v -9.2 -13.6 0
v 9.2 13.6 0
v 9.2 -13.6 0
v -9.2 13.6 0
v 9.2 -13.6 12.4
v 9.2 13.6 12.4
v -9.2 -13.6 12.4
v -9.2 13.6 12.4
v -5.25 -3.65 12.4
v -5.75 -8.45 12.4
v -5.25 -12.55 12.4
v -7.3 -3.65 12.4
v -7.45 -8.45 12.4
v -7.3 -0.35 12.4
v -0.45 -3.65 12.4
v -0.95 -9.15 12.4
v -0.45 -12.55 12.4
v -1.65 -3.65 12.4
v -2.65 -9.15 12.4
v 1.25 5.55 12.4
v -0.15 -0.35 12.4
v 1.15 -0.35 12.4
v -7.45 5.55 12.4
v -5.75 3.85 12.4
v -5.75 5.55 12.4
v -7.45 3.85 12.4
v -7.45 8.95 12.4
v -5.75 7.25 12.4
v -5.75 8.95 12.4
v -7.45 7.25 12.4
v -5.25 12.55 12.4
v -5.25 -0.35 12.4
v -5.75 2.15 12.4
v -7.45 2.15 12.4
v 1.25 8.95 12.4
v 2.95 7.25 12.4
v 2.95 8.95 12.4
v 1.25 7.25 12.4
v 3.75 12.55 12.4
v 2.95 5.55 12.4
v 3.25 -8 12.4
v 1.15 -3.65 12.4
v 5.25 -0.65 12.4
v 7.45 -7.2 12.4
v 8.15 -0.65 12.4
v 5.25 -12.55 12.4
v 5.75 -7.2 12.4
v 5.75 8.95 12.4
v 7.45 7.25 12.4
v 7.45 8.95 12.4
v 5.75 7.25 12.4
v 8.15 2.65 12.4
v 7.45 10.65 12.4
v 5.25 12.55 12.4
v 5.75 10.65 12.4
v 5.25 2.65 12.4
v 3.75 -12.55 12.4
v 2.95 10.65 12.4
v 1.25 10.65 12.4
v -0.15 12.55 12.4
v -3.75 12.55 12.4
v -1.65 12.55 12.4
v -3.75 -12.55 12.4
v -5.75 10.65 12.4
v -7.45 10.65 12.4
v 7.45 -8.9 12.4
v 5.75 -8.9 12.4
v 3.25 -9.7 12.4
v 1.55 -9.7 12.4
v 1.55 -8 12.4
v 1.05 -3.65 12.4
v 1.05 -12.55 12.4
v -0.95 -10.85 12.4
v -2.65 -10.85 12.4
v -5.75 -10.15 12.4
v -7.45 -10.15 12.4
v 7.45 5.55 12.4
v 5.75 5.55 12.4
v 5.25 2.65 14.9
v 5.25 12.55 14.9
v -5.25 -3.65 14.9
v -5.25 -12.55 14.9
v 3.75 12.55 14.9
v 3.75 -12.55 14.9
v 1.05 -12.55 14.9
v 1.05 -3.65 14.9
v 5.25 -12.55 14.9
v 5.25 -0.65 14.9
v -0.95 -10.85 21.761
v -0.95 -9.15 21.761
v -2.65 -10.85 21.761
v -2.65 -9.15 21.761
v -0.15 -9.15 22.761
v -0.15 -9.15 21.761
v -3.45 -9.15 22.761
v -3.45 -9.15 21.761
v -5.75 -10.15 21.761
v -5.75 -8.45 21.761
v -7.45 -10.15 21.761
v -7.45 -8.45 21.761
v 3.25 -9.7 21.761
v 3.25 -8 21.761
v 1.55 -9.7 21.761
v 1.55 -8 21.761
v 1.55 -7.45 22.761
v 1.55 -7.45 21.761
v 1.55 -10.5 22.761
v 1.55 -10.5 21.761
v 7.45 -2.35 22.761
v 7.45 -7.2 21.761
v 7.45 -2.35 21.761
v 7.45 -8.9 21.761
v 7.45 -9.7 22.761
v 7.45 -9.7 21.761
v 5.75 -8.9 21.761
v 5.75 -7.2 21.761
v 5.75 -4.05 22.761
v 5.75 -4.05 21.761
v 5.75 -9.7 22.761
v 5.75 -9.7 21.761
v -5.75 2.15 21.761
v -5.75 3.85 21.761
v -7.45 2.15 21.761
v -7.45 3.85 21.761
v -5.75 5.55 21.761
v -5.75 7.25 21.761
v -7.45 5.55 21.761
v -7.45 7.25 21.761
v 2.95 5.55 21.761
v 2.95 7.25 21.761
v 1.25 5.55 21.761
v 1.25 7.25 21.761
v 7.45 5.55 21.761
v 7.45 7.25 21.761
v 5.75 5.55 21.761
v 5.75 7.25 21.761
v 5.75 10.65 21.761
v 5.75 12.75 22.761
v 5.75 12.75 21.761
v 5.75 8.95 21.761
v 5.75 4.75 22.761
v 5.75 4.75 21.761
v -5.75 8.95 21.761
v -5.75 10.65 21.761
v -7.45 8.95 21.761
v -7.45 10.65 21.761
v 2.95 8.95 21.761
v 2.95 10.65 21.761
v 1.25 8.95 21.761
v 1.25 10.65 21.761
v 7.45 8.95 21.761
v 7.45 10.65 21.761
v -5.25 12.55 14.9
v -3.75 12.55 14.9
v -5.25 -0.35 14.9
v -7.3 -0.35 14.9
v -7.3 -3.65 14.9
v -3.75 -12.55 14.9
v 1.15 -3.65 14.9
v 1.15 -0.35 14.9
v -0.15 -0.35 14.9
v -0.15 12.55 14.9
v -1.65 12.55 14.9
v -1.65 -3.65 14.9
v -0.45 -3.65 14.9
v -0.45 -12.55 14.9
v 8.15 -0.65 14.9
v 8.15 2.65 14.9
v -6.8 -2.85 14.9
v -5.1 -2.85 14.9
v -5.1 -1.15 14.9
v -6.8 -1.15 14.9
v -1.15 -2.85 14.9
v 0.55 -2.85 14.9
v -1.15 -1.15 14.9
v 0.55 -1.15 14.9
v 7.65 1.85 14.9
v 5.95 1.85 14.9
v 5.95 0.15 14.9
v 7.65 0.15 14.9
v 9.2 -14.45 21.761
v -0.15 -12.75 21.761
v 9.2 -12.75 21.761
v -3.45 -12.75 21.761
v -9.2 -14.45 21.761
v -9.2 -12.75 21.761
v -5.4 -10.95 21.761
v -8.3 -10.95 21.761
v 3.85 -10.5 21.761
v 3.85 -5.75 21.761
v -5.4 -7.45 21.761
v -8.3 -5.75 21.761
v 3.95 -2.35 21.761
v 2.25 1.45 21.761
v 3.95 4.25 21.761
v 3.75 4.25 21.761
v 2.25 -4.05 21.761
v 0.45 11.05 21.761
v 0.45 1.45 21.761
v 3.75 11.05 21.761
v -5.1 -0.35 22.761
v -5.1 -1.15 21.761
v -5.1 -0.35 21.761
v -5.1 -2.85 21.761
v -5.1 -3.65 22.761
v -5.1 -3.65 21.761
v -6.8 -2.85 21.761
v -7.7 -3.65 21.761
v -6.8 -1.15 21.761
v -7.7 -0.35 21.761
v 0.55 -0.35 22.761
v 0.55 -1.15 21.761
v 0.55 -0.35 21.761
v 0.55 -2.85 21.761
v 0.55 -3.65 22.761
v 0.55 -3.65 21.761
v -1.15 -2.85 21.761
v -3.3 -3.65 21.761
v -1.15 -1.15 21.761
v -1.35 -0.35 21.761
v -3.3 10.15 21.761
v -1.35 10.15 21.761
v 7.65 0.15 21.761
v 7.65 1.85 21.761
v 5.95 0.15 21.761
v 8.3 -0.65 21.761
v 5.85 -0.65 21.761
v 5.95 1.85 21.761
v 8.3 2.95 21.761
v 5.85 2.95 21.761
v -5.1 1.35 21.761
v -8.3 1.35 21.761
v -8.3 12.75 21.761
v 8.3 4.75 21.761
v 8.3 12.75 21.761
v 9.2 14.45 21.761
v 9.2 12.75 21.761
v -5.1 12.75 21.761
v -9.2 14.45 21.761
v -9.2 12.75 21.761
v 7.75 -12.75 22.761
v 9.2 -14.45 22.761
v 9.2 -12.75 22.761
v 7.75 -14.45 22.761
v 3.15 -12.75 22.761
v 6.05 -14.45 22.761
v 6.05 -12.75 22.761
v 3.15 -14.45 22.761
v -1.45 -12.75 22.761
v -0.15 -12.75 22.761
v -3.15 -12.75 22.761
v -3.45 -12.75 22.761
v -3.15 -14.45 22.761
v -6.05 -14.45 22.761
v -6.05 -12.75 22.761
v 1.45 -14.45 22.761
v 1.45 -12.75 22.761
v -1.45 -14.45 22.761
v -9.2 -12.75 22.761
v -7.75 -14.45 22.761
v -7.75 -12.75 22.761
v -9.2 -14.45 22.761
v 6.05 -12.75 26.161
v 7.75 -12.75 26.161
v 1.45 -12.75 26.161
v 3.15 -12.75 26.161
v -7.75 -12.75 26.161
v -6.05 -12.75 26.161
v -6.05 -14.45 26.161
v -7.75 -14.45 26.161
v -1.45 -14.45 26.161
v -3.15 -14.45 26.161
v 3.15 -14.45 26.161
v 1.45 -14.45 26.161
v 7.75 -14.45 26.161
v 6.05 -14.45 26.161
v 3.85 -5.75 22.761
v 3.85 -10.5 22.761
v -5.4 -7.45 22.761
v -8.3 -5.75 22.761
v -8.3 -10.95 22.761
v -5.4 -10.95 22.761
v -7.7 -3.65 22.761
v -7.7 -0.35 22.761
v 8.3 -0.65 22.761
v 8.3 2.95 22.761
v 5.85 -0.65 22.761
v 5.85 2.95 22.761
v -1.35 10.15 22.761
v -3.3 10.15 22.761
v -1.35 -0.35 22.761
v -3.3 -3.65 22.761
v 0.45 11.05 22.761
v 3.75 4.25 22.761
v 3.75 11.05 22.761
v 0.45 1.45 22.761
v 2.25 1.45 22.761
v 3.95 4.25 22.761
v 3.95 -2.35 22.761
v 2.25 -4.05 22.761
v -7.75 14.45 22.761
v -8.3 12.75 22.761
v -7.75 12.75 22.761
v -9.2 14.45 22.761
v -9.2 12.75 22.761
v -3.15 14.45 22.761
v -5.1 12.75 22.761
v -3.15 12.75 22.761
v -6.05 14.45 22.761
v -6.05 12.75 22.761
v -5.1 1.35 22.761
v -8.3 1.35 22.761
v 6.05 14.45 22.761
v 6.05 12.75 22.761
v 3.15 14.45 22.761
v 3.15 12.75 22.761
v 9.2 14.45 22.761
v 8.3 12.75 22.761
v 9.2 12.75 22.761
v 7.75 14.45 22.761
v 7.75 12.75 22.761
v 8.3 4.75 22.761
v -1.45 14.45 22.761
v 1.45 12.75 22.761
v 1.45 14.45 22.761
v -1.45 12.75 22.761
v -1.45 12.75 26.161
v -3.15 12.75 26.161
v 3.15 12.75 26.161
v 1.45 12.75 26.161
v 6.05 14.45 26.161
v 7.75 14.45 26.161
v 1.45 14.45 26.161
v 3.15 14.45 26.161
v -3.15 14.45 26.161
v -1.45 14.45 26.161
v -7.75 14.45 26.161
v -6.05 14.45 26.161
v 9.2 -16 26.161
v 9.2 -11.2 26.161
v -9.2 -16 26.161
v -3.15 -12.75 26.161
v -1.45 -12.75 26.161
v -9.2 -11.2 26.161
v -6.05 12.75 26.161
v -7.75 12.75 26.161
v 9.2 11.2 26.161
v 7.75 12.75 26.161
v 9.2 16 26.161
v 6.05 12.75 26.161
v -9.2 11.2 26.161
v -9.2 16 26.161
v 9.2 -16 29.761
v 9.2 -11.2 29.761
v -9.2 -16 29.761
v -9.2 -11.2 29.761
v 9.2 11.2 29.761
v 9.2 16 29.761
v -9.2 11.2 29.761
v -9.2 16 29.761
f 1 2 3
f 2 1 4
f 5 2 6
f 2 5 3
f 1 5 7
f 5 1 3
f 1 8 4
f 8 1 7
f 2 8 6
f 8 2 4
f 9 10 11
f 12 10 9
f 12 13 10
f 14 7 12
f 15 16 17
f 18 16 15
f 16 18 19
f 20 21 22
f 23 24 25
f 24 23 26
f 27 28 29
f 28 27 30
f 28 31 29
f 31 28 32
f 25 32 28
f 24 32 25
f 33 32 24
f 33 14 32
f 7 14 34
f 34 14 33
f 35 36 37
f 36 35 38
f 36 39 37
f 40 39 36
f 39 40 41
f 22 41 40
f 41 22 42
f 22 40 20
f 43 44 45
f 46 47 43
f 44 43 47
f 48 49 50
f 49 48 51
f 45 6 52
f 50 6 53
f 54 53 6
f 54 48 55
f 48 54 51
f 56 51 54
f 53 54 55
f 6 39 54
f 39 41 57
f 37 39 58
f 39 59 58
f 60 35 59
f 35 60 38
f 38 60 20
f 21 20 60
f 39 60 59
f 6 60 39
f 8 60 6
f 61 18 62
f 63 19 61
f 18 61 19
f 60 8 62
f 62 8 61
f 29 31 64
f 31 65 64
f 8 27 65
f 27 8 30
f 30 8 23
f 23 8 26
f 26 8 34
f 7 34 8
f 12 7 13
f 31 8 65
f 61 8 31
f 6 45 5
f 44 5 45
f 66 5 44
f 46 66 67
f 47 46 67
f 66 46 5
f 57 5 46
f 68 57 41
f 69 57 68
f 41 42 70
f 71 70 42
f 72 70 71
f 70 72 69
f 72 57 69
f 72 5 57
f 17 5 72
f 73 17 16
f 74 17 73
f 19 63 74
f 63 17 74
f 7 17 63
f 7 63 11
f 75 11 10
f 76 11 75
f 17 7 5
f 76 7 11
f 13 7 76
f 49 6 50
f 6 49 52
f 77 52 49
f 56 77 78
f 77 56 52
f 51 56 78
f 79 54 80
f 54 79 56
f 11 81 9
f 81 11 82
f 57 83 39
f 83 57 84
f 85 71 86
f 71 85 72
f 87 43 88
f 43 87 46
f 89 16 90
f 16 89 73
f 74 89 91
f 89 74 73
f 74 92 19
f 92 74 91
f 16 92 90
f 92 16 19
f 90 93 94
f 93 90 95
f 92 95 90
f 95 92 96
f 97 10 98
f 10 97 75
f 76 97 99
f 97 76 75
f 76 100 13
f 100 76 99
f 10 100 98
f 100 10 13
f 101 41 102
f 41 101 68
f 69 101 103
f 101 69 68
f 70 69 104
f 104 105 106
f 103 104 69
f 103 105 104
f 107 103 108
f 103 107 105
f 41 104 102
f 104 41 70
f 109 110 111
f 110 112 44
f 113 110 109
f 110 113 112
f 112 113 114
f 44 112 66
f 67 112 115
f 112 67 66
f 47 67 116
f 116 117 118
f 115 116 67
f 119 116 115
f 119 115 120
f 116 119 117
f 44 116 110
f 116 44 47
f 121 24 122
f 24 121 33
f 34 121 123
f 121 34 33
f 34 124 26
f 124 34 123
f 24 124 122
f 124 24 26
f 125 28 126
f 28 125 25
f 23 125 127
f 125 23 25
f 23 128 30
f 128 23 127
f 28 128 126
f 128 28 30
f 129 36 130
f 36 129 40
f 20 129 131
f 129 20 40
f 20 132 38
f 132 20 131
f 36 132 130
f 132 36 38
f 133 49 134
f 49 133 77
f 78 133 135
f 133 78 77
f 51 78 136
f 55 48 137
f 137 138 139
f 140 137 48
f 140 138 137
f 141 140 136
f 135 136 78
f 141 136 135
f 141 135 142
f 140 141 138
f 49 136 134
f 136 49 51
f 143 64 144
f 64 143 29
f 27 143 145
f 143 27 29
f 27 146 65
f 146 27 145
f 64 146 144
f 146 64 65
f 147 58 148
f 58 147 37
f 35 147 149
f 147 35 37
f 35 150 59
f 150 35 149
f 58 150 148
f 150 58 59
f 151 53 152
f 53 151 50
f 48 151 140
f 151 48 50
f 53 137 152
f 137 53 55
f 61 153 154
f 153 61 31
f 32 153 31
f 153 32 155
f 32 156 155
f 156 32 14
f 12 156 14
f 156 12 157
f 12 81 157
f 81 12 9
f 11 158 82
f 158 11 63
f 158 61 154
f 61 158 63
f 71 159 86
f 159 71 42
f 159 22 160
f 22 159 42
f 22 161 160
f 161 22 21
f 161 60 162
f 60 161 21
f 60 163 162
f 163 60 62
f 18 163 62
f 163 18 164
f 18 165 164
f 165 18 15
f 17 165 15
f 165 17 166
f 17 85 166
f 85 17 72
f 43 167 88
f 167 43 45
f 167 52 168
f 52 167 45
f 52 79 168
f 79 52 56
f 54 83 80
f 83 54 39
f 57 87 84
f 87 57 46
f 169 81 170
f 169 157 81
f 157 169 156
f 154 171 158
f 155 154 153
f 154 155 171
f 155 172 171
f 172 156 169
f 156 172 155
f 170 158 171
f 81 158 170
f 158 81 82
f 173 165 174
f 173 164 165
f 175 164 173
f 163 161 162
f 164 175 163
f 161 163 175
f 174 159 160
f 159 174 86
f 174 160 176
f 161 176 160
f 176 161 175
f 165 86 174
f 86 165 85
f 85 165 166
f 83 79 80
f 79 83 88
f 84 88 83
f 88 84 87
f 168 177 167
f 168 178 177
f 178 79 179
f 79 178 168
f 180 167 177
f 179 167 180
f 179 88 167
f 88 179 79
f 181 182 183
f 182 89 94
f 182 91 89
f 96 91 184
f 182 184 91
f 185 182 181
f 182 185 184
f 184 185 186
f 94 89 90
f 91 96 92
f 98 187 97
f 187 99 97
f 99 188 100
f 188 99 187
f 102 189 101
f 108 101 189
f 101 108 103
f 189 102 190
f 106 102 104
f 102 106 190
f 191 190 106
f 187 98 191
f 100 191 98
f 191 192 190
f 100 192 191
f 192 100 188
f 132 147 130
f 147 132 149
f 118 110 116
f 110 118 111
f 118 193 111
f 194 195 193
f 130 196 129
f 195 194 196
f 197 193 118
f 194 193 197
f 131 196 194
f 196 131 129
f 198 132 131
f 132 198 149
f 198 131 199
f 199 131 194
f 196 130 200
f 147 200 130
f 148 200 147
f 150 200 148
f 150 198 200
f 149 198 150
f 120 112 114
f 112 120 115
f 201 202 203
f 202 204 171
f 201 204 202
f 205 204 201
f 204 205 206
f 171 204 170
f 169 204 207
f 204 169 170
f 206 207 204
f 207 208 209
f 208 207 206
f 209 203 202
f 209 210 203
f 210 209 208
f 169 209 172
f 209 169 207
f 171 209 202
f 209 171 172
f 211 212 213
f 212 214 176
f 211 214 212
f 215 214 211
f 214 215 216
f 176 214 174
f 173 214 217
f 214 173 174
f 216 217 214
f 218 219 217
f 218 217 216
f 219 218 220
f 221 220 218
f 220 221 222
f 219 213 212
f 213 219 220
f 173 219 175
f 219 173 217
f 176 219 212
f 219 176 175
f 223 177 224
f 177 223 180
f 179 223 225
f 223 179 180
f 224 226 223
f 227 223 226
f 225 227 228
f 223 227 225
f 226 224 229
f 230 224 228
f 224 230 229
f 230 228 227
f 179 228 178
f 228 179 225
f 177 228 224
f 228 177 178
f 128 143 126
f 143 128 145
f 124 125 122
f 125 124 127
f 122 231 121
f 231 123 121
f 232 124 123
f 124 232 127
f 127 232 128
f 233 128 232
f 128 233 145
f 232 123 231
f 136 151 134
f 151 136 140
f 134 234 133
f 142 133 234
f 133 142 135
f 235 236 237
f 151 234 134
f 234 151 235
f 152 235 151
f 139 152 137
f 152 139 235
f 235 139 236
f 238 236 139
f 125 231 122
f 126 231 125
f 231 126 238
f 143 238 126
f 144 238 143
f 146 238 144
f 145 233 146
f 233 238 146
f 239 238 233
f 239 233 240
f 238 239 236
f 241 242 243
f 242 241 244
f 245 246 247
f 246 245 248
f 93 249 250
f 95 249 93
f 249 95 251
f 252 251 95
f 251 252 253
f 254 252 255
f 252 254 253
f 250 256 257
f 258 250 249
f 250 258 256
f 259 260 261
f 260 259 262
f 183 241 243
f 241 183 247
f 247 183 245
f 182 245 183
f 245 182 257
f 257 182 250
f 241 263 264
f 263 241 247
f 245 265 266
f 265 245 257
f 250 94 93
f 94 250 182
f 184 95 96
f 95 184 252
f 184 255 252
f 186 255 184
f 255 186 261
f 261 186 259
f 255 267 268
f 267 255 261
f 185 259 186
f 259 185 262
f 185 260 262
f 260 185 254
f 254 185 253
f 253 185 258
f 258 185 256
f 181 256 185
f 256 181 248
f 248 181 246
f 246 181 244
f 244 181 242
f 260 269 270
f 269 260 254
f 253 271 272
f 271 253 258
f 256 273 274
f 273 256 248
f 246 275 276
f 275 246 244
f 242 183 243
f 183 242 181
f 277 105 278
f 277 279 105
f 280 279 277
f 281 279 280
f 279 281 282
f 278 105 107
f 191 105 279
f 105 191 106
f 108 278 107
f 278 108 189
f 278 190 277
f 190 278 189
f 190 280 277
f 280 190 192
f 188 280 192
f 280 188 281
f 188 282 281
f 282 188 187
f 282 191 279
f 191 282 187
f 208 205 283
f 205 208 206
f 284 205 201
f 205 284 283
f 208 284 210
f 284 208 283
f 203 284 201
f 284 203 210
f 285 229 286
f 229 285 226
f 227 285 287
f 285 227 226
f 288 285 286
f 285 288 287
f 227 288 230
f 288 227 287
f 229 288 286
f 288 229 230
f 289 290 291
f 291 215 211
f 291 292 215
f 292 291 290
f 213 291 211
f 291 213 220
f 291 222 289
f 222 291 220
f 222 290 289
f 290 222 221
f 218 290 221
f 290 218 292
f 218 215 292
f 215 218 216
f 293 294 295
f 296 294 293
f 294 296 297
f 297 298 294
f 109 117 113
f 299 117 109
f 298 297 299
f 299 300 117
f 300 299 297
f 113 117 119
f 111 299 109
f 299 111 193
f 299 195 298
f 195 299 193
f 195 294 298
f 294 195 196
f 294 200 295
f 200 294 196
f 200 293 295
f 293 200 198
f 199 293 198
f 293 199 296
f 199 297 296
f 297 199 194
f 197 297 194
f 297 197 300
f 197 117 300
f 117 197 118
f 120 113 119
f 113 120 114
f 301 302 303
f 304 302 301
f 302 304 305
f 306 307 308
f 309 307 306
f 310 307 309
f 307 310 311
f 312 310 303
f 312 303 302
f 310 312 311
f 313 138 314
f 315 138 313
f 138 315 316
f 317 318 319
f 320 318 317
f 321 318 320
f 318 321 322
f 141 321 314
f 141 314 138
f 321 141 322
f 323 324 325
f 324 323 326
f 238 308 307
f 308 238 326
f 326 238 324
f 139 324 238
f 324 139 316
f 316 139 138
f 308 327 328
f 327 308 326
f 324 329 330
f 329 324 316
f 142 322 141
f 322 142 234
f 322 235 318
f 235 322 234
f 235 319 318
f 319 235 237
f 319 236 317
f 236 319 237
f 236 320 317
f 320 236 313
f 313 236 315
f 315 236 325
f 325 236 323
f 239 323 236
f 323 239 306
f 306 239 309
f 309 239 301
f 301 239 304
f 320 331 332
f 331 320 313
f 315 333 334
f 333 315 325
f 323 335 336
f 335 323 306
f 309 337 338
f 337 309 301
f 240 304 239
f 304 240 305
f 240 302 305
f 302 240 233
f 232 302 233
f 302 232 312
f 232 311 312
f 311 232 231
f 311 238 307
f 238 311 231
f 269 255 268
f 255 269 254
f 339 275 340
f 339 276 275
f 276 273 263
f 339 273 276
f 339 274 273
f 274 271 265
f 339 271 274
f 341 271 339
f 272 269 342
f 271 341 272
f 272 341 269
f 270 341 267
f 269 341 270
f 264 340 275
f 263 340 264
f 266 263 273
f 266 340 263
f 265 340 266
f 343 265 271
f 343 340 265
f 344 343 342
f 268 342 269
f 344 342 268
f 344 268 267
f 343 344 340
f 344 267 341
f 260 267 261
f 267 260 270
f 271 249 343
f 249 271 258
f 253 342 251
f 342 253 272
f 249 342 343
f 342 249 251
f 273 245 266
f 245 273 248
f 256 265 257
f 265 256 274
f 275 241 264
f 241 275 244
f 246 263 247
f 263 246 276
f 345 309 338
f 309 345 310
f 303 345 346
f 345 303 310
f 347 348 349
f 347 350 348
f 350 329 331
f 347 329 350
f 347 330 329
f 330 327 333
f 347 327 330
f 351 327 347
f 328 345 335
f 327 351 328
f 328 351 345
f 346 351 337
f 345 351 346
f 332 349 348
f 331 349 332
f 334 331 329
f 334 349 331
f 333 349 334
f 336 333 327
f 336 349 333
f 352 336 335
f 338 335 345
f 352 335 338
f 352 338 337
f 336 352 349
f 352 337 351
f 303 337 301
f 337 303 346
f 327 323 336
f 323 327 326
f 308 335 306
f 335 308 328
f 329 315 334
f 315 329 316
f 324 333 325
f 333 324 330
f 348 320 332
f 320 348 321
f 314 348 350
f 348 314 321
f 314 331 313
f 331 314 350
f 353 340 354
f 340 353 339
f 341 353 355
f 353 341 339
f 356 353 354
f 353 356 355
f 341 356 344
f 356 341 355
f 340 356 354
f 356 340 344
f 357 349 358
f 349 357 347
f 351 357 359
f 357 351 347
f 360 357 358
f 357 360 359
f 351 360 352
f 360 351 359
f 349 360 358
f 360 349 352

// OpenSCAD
// Generated by SolidPython 0.4.2 on 2020-09-29 23:21:45
//!OpenSCAD

scale(v = 0.0100000000) {
	translate(v = [-920, -1360, 0]) {
		union() {
			color(c = [0.4000000000, 0.4000000000, 0.4000000000]) {
				translate(v = [0, 0, 0]) {
					linear_extrude(height = 1000.0000000000) {
						polygon(paths = [[0, 1, 2, 3]], points = [[0, 0], [0, 2720], [1840, 2720], [1840, 0]]);
					}
				}
			}
			color(c = [0.2000000000, 0.6000000000, 0.2000000000]) {
				translate(v = [0, 0, 1000.0000000000]) {
					linear_extrude(height = 120.0000000000) {
						polygon(paths = [[0, 1, 2, 3]], points = [[0, 1305], [0, 2720], [1840, 2720], [1840, 1305]]);
					}
				}
			}
			color(c = [0.4000000000, 0.4000000000, 0.4000000000]) {
				translate(v = [0, 0, 1000.0000000000]) {
					linear_extrude(height = 120.0000000000) {
						polygon(paths = [[0, 1, 2, 3]], points = [[0, 0], [0, 1305], [1840, 1305], [1840, 0]]);
					}
				}
			}
			color(c = [0.9000000000, 0.6000000000, 0.6000000000]) {
				translate(v = [0, 0, 1120.0000000000]) {
					linear_extrude(height = 120.0000000000) {
						polygon(paths = [[0, 1, 2, 3]], points = [[135, 1485], [135, 2485], [395, 2485], [395, 1485]]);
					}
				}
			}
			color(c = [0.9000000000, 0.6000000000, 0.6000000000]) {
				translate(v = [0, 0, 1120.0000000000]) {
					linear_extrude(height = 120.0000000000) {
						polygon(paths = [[0, 1, 2, 3]], points = [[545, 1485], [545, 2485], [755, 2485], [755, 1485]]);
					}
				}
			}
			color(c = [0.9000000000, 0.6000000000, 0.6000000000]) {
				translate(v = [0, 0, 1120.0000000000]) {
					linear_extrude(height = 120.0000000000) {
						polygon(paths = [[0, 1, 2, 3, 4, 5]], points = [[905, 1485], [905, 2485], [1295, 2485], [1295, 1785], [1155, 1785], [1155, 1485]]);
					}
				}
			}
			color(c = [0.9000000000, 0.6000000000, 0.6000000000]) {
				translate(v = [0, 0, 1120.0000000000]) {
					linear_extrude(height = 120.0000000000) {
						polygon(paths = [[0, 1, 2, 3]], points = [[1445, 1785], [1445, 2485], [1705, 2485], [1705, 1785]]);
					}
				}
			}
			color(c = [0.9000000000, 0.6000000000, 0.9000000000]) {
				translate(v = [0, 0, 1120.0000000000]) {
					linear_extrude(height = 120.0000000000) {
						polygon(paths = [[0, 1, 2, 3]], points = [[135, 235], [135, 885], [395, 885], [395, 235]]);
					}
				}
			}
			color(c = [0.9000000000, 0.6000000000, 0.9000000000]) {
				translate(v = [0, 0, 1120.0000000000]) {
					linear_extrude(height = 120.0000000000) {
						polygon(paths = [[0, 1, 2, 3]], points = [[545, 235], [545, 885], [875, 885], [875, 235]]);
					}
				}
			}
			color(c = [0.9000000000, 0.6000000000, 0.9000000000]) {
				translate(v = [0, 0, 1120.0000000000]) {
					linear_extrude(height = 120.0000000000) {
						polygon(paths = [[0, 1, 2, 3]], points = [[1025, 235], [1025, 885], [1295, 885], [1295, 235]]);
					}
				}
			}
			color(c = [0.9000000000, 0.6000000000, 0.9000000000]) {
				translate(v = [0, 0, 1120.0000000000]) {
					linear_extrude(height = 120.0000000000) {
						polygon(paths = [[0, 1, 2, 3]], points = [[1445, 235], [1445, 885], [1705, 885], [1705, 235]]);
					}
				}
			}
			color(c = [0.2000000000, 0.6000000000, 0.2000000000]) {
				translate(v = [0, 0, 1120.0000000000]) {
					linear_extrude(height = 120.0000000000) {
						difference() {
							polygon(paths = [[0, 1, 2, 3]], points = [[0, 1305], [0, 2720], [1840, 2720], [1840, 1305]]);
							polygon(paths = [[0, 1, 2, 3]], points = [[135, 1485], [395, 1485], [395, 2485], [135, 2485]]);
							polygon(paths = [[0, 1, 2, 3]], points = [[545, 1485], [755, 1485], [755, 2485], [545, 2485]]);
							polygon(paths = [[0, 1, 2, 3]], points = [[1445, 1785], [1705, 1785], [1705, 2485], [1445, 2485]]);
							polygon(paths = [[0, 1, 2, 3, 4, 5]], points = [[905, 1485], [1155, 1485], [1155, 1785], [1295, 1785], [1295, 2485], [905, 2485]]);
						}
					}
				}
			}
			color(c = [0.4000000000, 0.4000000000, 0.4000000000]) {
				translate(v = [0, 0, 1120.0000000000]) {
					linear_extrude(height = 120.0000000000) {
						difference() {
							polygon(paths = [[0, 1, 2, 3]], points = [[0, 0], [0, 1305], [1840, 1305], [1840, 0]]);
							polygon(paths = [[0, 1, 2, 3]], points = [[135, 235], [395, 235], [395, 885], [135, 885]]);
							polygon(paths = [[0, 1, 2, 3]], points = [[545, 235], [875, 235], [875, 885], [545, 885]]);
							polygon(paths = [[0, 1, 2, 3]], points = [[1025, 235], [1295, 235], [1295, 885], [1025, 885]]);
							polygon(paths = [[0, 1, 2, 3]], points = [[1445, 235], [1705, 235], [1705, 885], [1445, 885]]);
						}
					}
				}
			}
			color(c = [0.1000000000, 0.1000000000, 0.1000000000]) {
				translate(v = [0, 0, 1240.0000000000]) {
					linear_extrude(height = 70.0000000000) {
						polygon(paths = [[0, 1, 2, 3]], points = [[655, 275], [655, 445], [825, 445], [825, 275]]);
					}
				}
			}
			color(c = [0.1000000000, 0.1000000000, 0.1000000000]) {
				translate(v = [0, 0, 1240.0000000000]) {
					linear_extrude(height = 70.0000000000) {
						polygon(paths = [[0, 1, 2, 3]], points = [[175, 345], [175, 515], [345, 515], [345, 345]]);
					}
				}
			}
			color(c = [0.1000000000, 0.1000000000, 0.1000000000]) {
				translate(v = [0, 0, 1240.0000000000]) {
					linear_extrude(height = 70.0000000000) {
						polygon(paths = [[0, 1, 2, 3]], points = [[1075, 390], [1075, 560], [1245, 560], [1245, 390]]);
					}
				}
			}
			color(c = [0.1000000000, 0.1000000000, 0.1000000000]) {
				translate(v = [0, 0, 1240.0000000000]) {
					linear_extrude(height = 70.0000000000) {
						polygon(paths = [[0, 1, 2, 3]], points = [[1495, 470], [1495, 640], [1665, 640], [1665, 470]]);
					}
				}
			}
			color(c = [0.1000000000, 0.1000000000, 0.1000000000]) {
				translate(v = [0, 0, 1240.0000000000]) {
					linear_extrude(height = 70.0000000000) {
						polygon(paths = [[0, 1, 2, 3]], points = [[175, 1575], [175, 1745], [345, 1745], [345, 1575]]);
					}
				}
			}
			color(c = [0.1000000000, 0.1000000000, 0.1000000000]) {
				translate(v = [0, 0, 1240.0000000000]) {
					linear_extrude(height = 70.0000000000) {
						polygon(paths = [[0, 1, 2, 3]], points = [[175, 1915], [175, 2085], [345, 2085], [345, 1915]]);
					}
				}
			}
			color(c = [0.1000000000, 0.1000000000, 0.1000000000]) {
				translate(v = [0, 0, 1240.0000000000]) {
					linear_extrude(height = 70.0000000000) {
						polygon(paths = [[0, 1, 2, 3]], points = [[1045, 1915], [1045, 2085], [1215, 2085], [1215, 1915]]);
					}
				}
			}
			color(c = [0.1000000000, 0.1000000000, 0.1000000000]) {
				translate(v = [0, 0, 1240.0000000000]) {
					linear_extrude(height = 70.0000000000) {
						polygon(paths = [[0, 1, 2, 3]], points = [[1495, 1915], [1495, 2085], [1665, 2085], [1665, 1915]]);
					}
				}
			}
			color(c = [0.1000000000, 0.1000000000, 0.1000000000]) {
				translate(v = [0, 0, 1240.0000000000]) {
					linear_extrude(height = 70.0000000000) {
						polygon(paths = [[0, 1, 2, 3]], points = [[175, 2255], [175, 2425], [345, 2425], [345, 2255]]);
					}
				}
			}
			color(c = [0.1000000000, 0.1000000000, 0.1000000000]) {
				translate(v = [0, 0, 1240.0000000000]) {
					linear_extrude(height = 70.0000000000) {
						polygon(paths = [[0, 1, 2, 3]], points = [[1045, 2255], [1045, 2425], [1215, 2425], [1215, 2255]]);
					}
				}
			}
			color(c = [0.1000000000, 0.1000000000, 0.1000000000]) {
				translate(v = [0, 0, 1240.0000000000]) {
					linear_extrude(height = 70.0000000000) {
						polygon(paths = [[0, 1, 2, 3]], points = [[1495, 2255], [1495, 2425], [1665, 2425], [1665, 2255]]);
					}
				}
			}
			color(c = [1.0000000000, 1.0000000000, 1.0000000000]) {
				translate(v = [0, 0, 1240.0000000000]) {
					linear_extrude(height = 70.0000000000) {
						polygon(paths = [[0, 1, 2, 3, 4, 5, 6, 7]], points = [[395, 105], [395, 995], [190, 995], [190, 1325], [395, 1325], [395, 2615], [545, 2615], [545, 105]]);
					}
				}
			}
			color(c = [1.0000000000, 1.0000000000, 1.0000000000]) {
				translate(v = [0, 0, 1240.0000000000]) {
					linear_extrude(height = 70.0000000000) {
						polygon(paths = [[0, 1, 2, 3, 4, 5, 6, 7, 8, 9]], points = [[875, 105], [875, 995], [755, 995], [755, 2615], [905, 2615], [905, 1325], [1035, 1325], [1035, 995], [1025, 995], [1025, 105]]);
					}
				}
			}
			color(c = [1.0000000000, 1.0000000000, 1.0000000000]) {
				translate(v = [0, 0, 1240.0000000000]) {
					linear_extrude(height = 70.0000000000) {
						polygon(paths = [[0, 1, 2, 3, 4, 5, 6, 7]], points = [[1295, 105], [1295, 2615], [1445, 2615], [1445, 1625], [1735, 1625], [1735, 1295], [1445, 1295], [1445, 105]]);
					}
				}
			}
			color(c = [0.1000000000, 0.1000000000, 0.1000000000]) {
				translate(v = [0, 0, 1310.0000000000]) {
					linear_extrude(height = 180.0000000000) {
						polygon(paths = [[0, 1, 2, 3]], points = [[655, 275], [655, 445], [825, 445], [825, 275]]);
					}
				}
			}
			color(c = [0.1000000000, 0.1000000000, 0.1000000000]) {
				translate(v = [0, 0, 1310.0000000000]) {
					linear_extrude(height = 180.0000000000) {
						polygon(paths = [[0, 1, 2, 3]], points = [[175, 345], [175, 515], [345, 515], [345, 345]]);
					}
				}
			}
			color(c = [0.1000000000, 0.1000000000, 0.1000000000]) {
				translate(v = [0, 0, 1310.0000000000]) {
					linear_extrude(height = 180.0000000000) {
						polygon(paths = [[0, 1, 2, 3]], points = [[1075, 390], [1075, 560], [1245, 560], [1245, 390]]);
					}
				}
			}
			color(c = [0.1000000000, 0.1000000000, 0.1000000000]) {
				translate(v = [0, 0, 1310.0000000000]) {
					linear_extrude(height = 180.0000000000) {
						polygon(paths = [[0, 1, 2, 3]], points = [[1495, 470], [1495, 640], [1665, 640], [1665, 470]]);
					}
				}
			}
			color(c = [0.1000000000, 0.1000000000, 0.1000000000]) {
				translate(v = [0, 0, 1310.0000000000]) {
					linear_extrude(height = 180.0000000000) {
						polygon(paths = [[0, 1, 2, 3]], points = [[175, 1575], [175, 1745], [345, 1745], [345, 1575]]);
					}
				}
			}
			color(c = [0.1000000000, 0.1000000000, 0.1000000000]) {
				translate(v = [0, 0, 1310.0000000000]) {
					linear_extrude(height = 180.0000000000) {
						polygon(paths = [[0, 1, 2, 3]], points = [[175, 1915], [175, 2085], [345, 2085], [345, 1915]]);
					}
				}
			}
			color(c = [0.1000000000, 0.1000000000, 0.1000000000]) {
				translate(v = [0, 0, 1310.0000000000]) {
					linear_extrude(height = 180.0000000000) {
						polygon(paths = [[0, 1, 2, 3]], points = [[1045, 1915], [1045, 2085], [1215, 2085], [1215, 1915]]);
					}
				}
			}
			color(c = [0.1000000000, 0.1000000000, 0.1000000000]) {
				translate(v = [0, 0, 1310.0000000000]) {
					linear_extrude(height = 180.0000000000) {
						polygon(paths = [[0, 1, 2, 3]], points = [[1495, 1915], [1495, 2085], [1665, 2085], [1665, 1915]]);
					}
				}
			}
			color(c = [0.1000000000, 0.1000000000, 0.1000000000]) {
				translate(v = [0, 0, 1310.0000000000]) {
					linear_extrude(height = 180.0000000000) {
						polygon(paths = [[0, 1, 2, 3]], points = [[175, 2255], [175, 2425], [345, 2425], [345, 2255]]);
					}
				}
			}
			color(c = [0.1000000000, 0.1000000000, 0.1000000000]) {
				translate(v = [0, 0, 1310.0000000000]) {
					linear_extrude(height = 180.0000000000) {
						polygon(paths = [[0, 1, 2, 3]], points = [[1045, 2255], [1045, 2425], [1215, 2425], [1215, 2255]]);
					}
				}
			}
			color(c = [0.1000000000, 0.1000000000, 0.1000000000]) {
				translate(v = [0, 0, 1310.0000000000]) {
					linear_extrude(height = 180.0000000000) {
						polygon(paths = [[0, 1, 2, 3]], points = [[1495, 2255], [1495, 2425], [1665, 2425], [1665, 2255]]);
					}
				}
			}
			color(c = [0.7000000000, 0, 0]) {
				translate(v = [0, 0, 1310.0000000000]) {
					linear_extrude(height = 180.0000000000) {
						polygon(paths = [[0, 1, 2, 3, 4, 5, 6, 7]], points = [[395, 105], [395, 995], [190, 995], [190, 1325], [395, 1325], [395, 2615], [545, 2615], [545, 105]]);
					}
				}
			}
			color(c = [0.7000000000, 0, 0]) {
				translate(v = [0, 0, 1310.0000000000]) {
					linear_extrude(height = 180.0000000000) {
						polygon(paths = [[0, 1, 2, 3, 4, 5, 6, 7, 8, 9]], points = [[875, 105], [875, 995], [755, 995], [755, 2615], [905, 2615], [905, 1325], [1035, 1325], [1035, 995], [1025, 995], [1025, 105]]);
					}
				}
			}
			color(c = [0.7000000000, 0, 0]) {
				translate(v = [0, 0, 1310.0000000000]) {
					linear_extrude(height = 180.0000000000) {
						polygon(paths = [[0, 1, 2, 3, 4, 5, 6, 7]], points = [[1295, 105], [1295, 2615], [1445, 2615], [1445, 1625], [1735, 1625], [1735, 1295], [1445, 1295], [1445, 105]]);
					}
				}
			}
			color(c = [0.1000000000, 0.1000000000, 0.1000000000]) {
				translate(v = [0, 0, 1490.0000000000]) {
					linear_extrude(height = 686.1000000000) {
						polygon(paths = [[0, 1, 2, 3]], points = [[655, 275], [655, 445], [825, 445], [825, 275]]);
					}
				}
			}
			color(c = [0.1000000000, 0.1000000000, 0.1000000000]) {
				translate(v = [0, 0, 1490.0000000000]) {
					linear_extrude(height = 686.1000000000) {
						polygon(paths = [[0, 1, 2, 3]], points = [[175, 345], [175, 515], [345, 515], [345, 345]]);
					}
				}
			}
			color(c = [0.1000000000, 0.1000000000, 0.1000000000]) {
				translate(v = [0, 0, 1490.0000000000]) {
					linear_extrude(height = 686.1000000000) {
						polygon(paths = [[0, 1, 2, 3]], points = [[1075, 390], [1075, 560], [1245, 560], [1245, 390]]);
					}
				}
			}
			color(c = [0.1000000000, 0.1000000000, 0.1000000000]) {
				translate(v = [0, 0, 1490.0000000000]) {
					linear_extrude(height = 686.1000000000) {
						polygon(paths = [[0, 1, 2, 3]], points = [[1495, 470], [1495, 640], [1665, 640], [1665, 470]]);
					}
				}
			}
			color(c = [0.1000000000, 0.1000000000, 0.1000000000]) {
				translate(v = [0, 0, 1490.0000000000]) {
					linear_extrude(height = 686.1000000000) {
						polygon(paths = [[0, 1, 2, 3]], points = [[240, 1075], [240, 1245], [410, 1245], [410, 1075]]);
					}
				}
			}
			color(c = [0.1000000000, 0.1000000000, 0.1000000000]) {
				translate(v = [0, 0, 1490.0000000000]) {
					linear_extrude(height = 686.1000000000) {
						polygon(paths = [[0, 1, 2, 3]], points = [[805, 1075], [805, 1245], [975, 1245], [975, 1075]]);
					}
				}
			}
			color(c = [0.1000000000, 0.1000000000, 0.1000000000]) {
				translate(v = [0, 0, 1490.0000000000]) {
					linear_extrude(height = 686.1000000000) {
						polygon(paths = [[0, 1, 2, 3]], points = [[1515, 1375], [1515, 1545], [1685, 1545], [1685, 1375]]);
					}
				}
			}
			color(c = [0.1000000000, 0.1000000000, 0.1000000000]) {
				translate(v = [0, 0, 1490.0000000000]) {
					linear_extrude(height = 686.1000000000) {
						polygon(paths = [[0, 1, 2, 3]], points = [[175, 1575], [175, 1745], [345, 1745], [345, 1575]]);
					}
				}
			}
			color(c = [0.1000000000, 0.1000000000, 0.1000000000]) {
				translate(v = [0, 0, 1490.0000000000]) {
					linear_extrude(height = 686.1000000000) {
						polygon(paths = [[0, 1, 2, 3]], points = [[175, 1915], [175, 2085], [345, 2085], [345, 1915]]);
					}
				}
			}
			color(c = [0.1000000000, 0.1000000000, 0.1000000000]) {
				translate(v = [0, 0, 1490.0000000000]) {
					linear_extrude(height = 686.1000000000) {
						polygon(paths = [[0, 1, 2, 3]], points = [[1045, 1915], [1045, 2085], [1215, 2085], [1215, 1915]]);
					}
				}
			}
			color(c = [0.1000000000, 0.1000000000, 0.1000000000]) {
				translate(v = [0, 0, 1490.0000000000]) {
					linear_extrude(height = 686.1000000000) {
						polygon(paths = [[0, 1, 2, 3]], points = [[1495, 1915], [1495, 2085], [1665, 2085], [1665, 1915]]);
					}
				}
			}
			color(c = [0.1000000000, 0.1000000000, 0.1000000000]) {
				translate(v = [0, 0, 1490.0000000000]) {
					linear_extrude(height = 686.1000000000) {
						polygon(paths = [[0, 1, 2, 3]], points = [[175, 2255], [175, 2425], [345, 2425], [345, 2255]]);
					}
				}
			}
			color(c = [0.1000000000, 0.1000000000, 0.1000000000]) {
				translate(v = [0, 0, 1490.0000000000]) {
					linear_extrude(height = 686.1000000000) {
						polygon(paths = [[0, 1, 2, 3]], points = [[1045, 2255], [1045, 2425], [1215, 2425], [1215, 2255]]);
					}
				}
			}
			color(c = [0.1000000000, 0.1000000000, 0.1000000000]) {
				translate(v = [0, 0, 1490.0000000000]) {
					linear_extrude(height = 686.1000000000) {
						polygon(paths = [[0, 1, 2, 3]], points = [[1495, 2255], [1495, 2425], [1665, 2425], [1665, 2255]]);
					}
				}
			}
			color(c = [0.9000000000, 0.6000000000, 0.6000000000]) {
				translate(v = [0, 0, 2176.1000000000]) {
					linear_extrude(height = 100.0000000000) {
						polygon(paths = [[0, 1, 2, 3, 4, 5, 6, 7]], points = [[0, -85], [0, 85], [575, 85], [575, 445], [905, 445], [905, 85], [1840, 85], [1840, -85]]);
					}
				}
			}
			color(c = [0.9000000000, 0.6000000000, 0.6000000000]) {
				translate(v = [0, 0, 2176.1000000000]) {
					linear_extrude(height = 100.0000000000) {
						polygon(paths = [[0, 1, 2, 3, 4, 5, 6, 7]], points = [[90, 265], [90, 785], [1305, 785], [1305, 310], [1075, 310], [1075, 615], [380, 615], [380, 265]]);
					}
				}
			}
			color(c = [0.9000000000, 0.6000000000, 0.6000000000]) {
				translate(v = [0, 0, 2176.1000000000]) {
					linear_extrude(height = 100.0000000000) {
						polygon(paths = [[0, 1, 2, 3]], points = [[150, 995], [150, 1325], [410, 1325], [410, 995]]);
					}
				}
			}
			color(c = [0.9000000000, 0.6000000000, 0.6000000000]) {
				translate(v = [0, 0, 2176.1000000000]) {
					linear_extrude(height = 100.0000000000) {
						polygon(paths = [[0, 1, 2, 3]], points = [[1505, 1295], [1505, 1655], [1750, 1655], [1750, 1295]]);
					}
				}
			}
			color(c = [0.9000000000, 0.6000000000, 0.6000000000]) {
				translate(v = [0, 0, 2176.1000000000]) {
					linear_extrude(height = 100.0000000000) {
						polygon(paths = [[0, 1, 2, 3, 4, 5]], points = [[590, 995], [590, 2375], [785, 2375], [785, 1325], [975, 1325], [975, 995]]);
					}
				}
			}
			color(c = [0.9000000000, 0.6000000000, 0.6000000000]) {
				translate(v = [0, 0, 2176.1000000000]) {
					linear_extrude(height = 100.0000000000) {
						polygon(paths = [[0, 1, 2, 3, 4, 5, 6, 7, 8, 9, 10, 11]], points = [[1495, 390], [1495, 955], [1145, 955], [1145, 1505], [965, 1505], [965, 2465], [1295, 2465], [1295, 1785], [1315, 1785], [1315, 1125], [1665, 1125], [1665, 390]]);
					}
				}
			}
			color(c = [0.9000000000, 0.6000000000, 0.6000000000]) {
				translate(v = [0, 0, 2176.1000000000]) {
					linear_extrude(height = 100.0000000000) {
						polygon(paths = [[0, 1, 2, 3, 4, 5, 6, 7, 8, 9, 10, 11]], points = [[90, 1495], [90, 2635], [0, 2635], [0, 2805], [1840, 2805], [1840, 2635], [1750, 2635], [1750, 1835], [1495, 1835], [1495, 2635], [410, 2635], [410, 1495]]);
					}
				}
			}
			color(c = [0.5000000000, 0.5000000000, 0.5000000000]) {
				translate(v = [0, 0, 2276.1000000000]) {
					linear_extrude(height = 340.0000000000) {
						polygon(paths = [[0, 1, 2, 3]], points = [[145, -85], [145, 85], [315, 85], [315, -85]]);
					}
				}
			}
			color(c = [0.5000000000, 0.5000000000, 0.5000000000]) {
				translate(v = [0, 0, 2276.1000000000]) {
					linear_extrude(height = 340.0000000000) {
						polygon(paths = [[0, 1, 2, 3]], points = [[605, -85], [605, 85], [775, 85], [775, -85]]);
					}
				}
			}
			color(c = [0.5000000000, 0.5000000000, 0.5000000000]) {
				translate(v = [0, 0, 2276.1000000000]) {
					linear_extrude(height = 340.0000000000) {
						polygon(paths = [[0, 1, 2, 3]], points = [[1065, -85], [1065, 85], [1235, 85], [1235, -85]]);
					}
				}
			}
			color(c = [0.5000000000, 0.5000000000, 0.5000000000]) {
				translate(v = [0, 0, 2276.1000000000]) {
					linear_extrude(height = 340.0000000000) {
						polygon(paths = [[0, 1, 2, 3]], points = [[1525, -85], [1525, 85], [1695, 85], [1695, -85]]);
					}
				}
			}
			color(c = [0.5000000000, 0.5000000000, 0.5000000000]) {
				translate(v = [0, 0, 2276.1000000000]) {
					linear_extrude(height = 340.0000000000) {
						polygon(paths = [[0, 1, 2, 3]], points = [[145, 2635], [145, 2805], [315, 2805], [315, 2635]]);
					}
				}
			}
			color(c = [0.5000000000, 0.5000000000, 0.5000000000]) {
				translate(v = [0, 0, 2276.1000000000]) {
					linear_extrude(height = 340.0000000000) {
						polygon(paths = [[0, 1, 2, 3]], points = [[605, 2635], [605, 2805], [775, 2805], [775, 2635]]);
					}
				}
			}
			color(c = [0.5000000000, 0.5000000000, 0.5000000000]) {
				translate(v = [0, 0, 2276.1000000000]) {
					linear_extrude(height = 340.0000000000) {
						polygon(paths = [[0, 1, 2, 3]], points = [[1065, 2635], [1065, 2805], [1235, 2805], [1235, 2635]]);
					}
				}
			}
			color(c = [0.5000000000, 0.5000000000, 0.5000000000]) {
				translate(v = [0, 0, 2276.1000000000]) {
					linear_extrude(height = 340.0000000000) {
						polygon(paths = [[0, 1, 2, 3]], points = [[1525, 2635], [1525, 2805], [1695, 2805], [1695, 2635]]);
					}
				}
			}
			color(c = [0.3000000000, 0.3000000000, 1]) {
				translate(v = [0, 0, 2616.1000000000]) {
					linear_extrude(height = 360.0000000000) {
						polygon(paths = [[0, 1, 2, 3]], points = [[0, -240], [0, 240], [1840, 240], [1840, -240]]);
					}
				}
			}
			color(c = [0.3000000000, 0.3000000000, 1]) {
				translate(v = [0, 0, 2616.1000000000]) {
					linear_extrude(height = 360.0000000000) {
						polygon(paths = [[0, 1, 2, 3]], points = [[0, 2480], [0, 2960], [1840, 2960], [1840, 2480]]);
					}
				}
			}
		}
	}
}
